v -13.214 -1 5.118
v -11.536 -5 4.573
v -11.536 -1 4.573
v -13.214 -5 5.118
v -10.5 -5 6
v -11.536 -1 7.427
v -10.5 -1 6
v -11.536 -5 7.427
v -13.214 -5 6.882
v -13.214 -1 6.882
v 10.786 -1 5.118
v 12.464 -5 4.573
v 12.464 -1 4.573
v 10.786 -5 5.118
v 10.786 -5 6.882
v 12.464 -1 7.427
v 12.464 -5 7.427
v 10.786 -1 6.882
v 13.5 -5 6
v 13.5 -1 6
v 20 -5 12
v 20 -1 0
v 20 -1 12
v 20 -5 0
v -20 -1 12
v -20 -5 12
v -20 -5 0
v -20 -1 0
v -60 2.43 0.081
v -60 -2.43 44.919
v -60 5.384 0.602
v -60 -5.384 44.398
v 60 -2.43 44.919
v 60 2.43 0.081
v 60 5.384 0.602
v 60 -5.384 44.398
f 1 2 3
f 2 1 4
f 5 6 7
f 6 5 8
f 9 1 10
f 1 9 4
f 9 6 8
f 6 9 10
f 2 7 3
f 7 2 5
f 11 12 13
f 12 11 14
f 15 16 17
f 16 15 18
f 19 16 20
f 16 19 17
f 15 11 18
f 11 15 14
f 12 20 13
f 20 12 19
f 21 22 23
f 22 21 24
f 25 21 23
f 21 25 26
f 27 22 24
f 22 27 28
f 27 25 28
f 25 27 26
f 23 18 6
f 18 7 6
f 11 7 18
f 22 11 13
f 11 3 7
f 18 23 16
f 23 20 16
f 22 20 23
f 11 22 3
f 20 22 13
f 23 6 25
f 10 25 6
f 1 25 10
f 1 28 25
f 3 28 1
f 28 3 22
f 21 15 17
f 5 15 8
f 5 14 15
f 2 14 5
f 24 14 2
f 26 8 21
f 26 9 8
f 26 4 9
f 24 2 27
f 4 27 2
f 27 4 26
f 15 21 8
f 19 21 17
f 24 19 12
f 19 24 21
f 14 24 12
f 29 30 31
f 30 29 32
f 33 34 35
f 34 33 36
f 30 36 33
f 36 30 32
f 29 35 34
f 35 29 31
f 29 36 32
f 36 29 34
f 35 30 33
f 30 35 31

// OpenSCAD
union() {
  translate([0.0, 0.0, 22.5]) {
  rotate(a=10.0, v=[1.0, 0.0, 0.0]) {
  // Snowplow blade
cube([120.0, 3.0, 45.0], center=true);
}
}
  translate([0.0, -3.0, 6.0]) {
  difference() {
  // Chassis mount plate
cube([40.0, 4.0, 12.0], center=true);
  union() {
  translate([-12.0, 0.0, 0.0]) {
  rotate([90.0, 0.0, 0.0]) {
  cylinder(h=6.0, r=1.5, center=true);
}
}
  translate([12.0, 0.0, 0.0]) {
  rotate([90.0, 0.0, 0.0]) {
  cylinder(h=6.0, r=1.5, center=true);
}
}
}
}
}
}
